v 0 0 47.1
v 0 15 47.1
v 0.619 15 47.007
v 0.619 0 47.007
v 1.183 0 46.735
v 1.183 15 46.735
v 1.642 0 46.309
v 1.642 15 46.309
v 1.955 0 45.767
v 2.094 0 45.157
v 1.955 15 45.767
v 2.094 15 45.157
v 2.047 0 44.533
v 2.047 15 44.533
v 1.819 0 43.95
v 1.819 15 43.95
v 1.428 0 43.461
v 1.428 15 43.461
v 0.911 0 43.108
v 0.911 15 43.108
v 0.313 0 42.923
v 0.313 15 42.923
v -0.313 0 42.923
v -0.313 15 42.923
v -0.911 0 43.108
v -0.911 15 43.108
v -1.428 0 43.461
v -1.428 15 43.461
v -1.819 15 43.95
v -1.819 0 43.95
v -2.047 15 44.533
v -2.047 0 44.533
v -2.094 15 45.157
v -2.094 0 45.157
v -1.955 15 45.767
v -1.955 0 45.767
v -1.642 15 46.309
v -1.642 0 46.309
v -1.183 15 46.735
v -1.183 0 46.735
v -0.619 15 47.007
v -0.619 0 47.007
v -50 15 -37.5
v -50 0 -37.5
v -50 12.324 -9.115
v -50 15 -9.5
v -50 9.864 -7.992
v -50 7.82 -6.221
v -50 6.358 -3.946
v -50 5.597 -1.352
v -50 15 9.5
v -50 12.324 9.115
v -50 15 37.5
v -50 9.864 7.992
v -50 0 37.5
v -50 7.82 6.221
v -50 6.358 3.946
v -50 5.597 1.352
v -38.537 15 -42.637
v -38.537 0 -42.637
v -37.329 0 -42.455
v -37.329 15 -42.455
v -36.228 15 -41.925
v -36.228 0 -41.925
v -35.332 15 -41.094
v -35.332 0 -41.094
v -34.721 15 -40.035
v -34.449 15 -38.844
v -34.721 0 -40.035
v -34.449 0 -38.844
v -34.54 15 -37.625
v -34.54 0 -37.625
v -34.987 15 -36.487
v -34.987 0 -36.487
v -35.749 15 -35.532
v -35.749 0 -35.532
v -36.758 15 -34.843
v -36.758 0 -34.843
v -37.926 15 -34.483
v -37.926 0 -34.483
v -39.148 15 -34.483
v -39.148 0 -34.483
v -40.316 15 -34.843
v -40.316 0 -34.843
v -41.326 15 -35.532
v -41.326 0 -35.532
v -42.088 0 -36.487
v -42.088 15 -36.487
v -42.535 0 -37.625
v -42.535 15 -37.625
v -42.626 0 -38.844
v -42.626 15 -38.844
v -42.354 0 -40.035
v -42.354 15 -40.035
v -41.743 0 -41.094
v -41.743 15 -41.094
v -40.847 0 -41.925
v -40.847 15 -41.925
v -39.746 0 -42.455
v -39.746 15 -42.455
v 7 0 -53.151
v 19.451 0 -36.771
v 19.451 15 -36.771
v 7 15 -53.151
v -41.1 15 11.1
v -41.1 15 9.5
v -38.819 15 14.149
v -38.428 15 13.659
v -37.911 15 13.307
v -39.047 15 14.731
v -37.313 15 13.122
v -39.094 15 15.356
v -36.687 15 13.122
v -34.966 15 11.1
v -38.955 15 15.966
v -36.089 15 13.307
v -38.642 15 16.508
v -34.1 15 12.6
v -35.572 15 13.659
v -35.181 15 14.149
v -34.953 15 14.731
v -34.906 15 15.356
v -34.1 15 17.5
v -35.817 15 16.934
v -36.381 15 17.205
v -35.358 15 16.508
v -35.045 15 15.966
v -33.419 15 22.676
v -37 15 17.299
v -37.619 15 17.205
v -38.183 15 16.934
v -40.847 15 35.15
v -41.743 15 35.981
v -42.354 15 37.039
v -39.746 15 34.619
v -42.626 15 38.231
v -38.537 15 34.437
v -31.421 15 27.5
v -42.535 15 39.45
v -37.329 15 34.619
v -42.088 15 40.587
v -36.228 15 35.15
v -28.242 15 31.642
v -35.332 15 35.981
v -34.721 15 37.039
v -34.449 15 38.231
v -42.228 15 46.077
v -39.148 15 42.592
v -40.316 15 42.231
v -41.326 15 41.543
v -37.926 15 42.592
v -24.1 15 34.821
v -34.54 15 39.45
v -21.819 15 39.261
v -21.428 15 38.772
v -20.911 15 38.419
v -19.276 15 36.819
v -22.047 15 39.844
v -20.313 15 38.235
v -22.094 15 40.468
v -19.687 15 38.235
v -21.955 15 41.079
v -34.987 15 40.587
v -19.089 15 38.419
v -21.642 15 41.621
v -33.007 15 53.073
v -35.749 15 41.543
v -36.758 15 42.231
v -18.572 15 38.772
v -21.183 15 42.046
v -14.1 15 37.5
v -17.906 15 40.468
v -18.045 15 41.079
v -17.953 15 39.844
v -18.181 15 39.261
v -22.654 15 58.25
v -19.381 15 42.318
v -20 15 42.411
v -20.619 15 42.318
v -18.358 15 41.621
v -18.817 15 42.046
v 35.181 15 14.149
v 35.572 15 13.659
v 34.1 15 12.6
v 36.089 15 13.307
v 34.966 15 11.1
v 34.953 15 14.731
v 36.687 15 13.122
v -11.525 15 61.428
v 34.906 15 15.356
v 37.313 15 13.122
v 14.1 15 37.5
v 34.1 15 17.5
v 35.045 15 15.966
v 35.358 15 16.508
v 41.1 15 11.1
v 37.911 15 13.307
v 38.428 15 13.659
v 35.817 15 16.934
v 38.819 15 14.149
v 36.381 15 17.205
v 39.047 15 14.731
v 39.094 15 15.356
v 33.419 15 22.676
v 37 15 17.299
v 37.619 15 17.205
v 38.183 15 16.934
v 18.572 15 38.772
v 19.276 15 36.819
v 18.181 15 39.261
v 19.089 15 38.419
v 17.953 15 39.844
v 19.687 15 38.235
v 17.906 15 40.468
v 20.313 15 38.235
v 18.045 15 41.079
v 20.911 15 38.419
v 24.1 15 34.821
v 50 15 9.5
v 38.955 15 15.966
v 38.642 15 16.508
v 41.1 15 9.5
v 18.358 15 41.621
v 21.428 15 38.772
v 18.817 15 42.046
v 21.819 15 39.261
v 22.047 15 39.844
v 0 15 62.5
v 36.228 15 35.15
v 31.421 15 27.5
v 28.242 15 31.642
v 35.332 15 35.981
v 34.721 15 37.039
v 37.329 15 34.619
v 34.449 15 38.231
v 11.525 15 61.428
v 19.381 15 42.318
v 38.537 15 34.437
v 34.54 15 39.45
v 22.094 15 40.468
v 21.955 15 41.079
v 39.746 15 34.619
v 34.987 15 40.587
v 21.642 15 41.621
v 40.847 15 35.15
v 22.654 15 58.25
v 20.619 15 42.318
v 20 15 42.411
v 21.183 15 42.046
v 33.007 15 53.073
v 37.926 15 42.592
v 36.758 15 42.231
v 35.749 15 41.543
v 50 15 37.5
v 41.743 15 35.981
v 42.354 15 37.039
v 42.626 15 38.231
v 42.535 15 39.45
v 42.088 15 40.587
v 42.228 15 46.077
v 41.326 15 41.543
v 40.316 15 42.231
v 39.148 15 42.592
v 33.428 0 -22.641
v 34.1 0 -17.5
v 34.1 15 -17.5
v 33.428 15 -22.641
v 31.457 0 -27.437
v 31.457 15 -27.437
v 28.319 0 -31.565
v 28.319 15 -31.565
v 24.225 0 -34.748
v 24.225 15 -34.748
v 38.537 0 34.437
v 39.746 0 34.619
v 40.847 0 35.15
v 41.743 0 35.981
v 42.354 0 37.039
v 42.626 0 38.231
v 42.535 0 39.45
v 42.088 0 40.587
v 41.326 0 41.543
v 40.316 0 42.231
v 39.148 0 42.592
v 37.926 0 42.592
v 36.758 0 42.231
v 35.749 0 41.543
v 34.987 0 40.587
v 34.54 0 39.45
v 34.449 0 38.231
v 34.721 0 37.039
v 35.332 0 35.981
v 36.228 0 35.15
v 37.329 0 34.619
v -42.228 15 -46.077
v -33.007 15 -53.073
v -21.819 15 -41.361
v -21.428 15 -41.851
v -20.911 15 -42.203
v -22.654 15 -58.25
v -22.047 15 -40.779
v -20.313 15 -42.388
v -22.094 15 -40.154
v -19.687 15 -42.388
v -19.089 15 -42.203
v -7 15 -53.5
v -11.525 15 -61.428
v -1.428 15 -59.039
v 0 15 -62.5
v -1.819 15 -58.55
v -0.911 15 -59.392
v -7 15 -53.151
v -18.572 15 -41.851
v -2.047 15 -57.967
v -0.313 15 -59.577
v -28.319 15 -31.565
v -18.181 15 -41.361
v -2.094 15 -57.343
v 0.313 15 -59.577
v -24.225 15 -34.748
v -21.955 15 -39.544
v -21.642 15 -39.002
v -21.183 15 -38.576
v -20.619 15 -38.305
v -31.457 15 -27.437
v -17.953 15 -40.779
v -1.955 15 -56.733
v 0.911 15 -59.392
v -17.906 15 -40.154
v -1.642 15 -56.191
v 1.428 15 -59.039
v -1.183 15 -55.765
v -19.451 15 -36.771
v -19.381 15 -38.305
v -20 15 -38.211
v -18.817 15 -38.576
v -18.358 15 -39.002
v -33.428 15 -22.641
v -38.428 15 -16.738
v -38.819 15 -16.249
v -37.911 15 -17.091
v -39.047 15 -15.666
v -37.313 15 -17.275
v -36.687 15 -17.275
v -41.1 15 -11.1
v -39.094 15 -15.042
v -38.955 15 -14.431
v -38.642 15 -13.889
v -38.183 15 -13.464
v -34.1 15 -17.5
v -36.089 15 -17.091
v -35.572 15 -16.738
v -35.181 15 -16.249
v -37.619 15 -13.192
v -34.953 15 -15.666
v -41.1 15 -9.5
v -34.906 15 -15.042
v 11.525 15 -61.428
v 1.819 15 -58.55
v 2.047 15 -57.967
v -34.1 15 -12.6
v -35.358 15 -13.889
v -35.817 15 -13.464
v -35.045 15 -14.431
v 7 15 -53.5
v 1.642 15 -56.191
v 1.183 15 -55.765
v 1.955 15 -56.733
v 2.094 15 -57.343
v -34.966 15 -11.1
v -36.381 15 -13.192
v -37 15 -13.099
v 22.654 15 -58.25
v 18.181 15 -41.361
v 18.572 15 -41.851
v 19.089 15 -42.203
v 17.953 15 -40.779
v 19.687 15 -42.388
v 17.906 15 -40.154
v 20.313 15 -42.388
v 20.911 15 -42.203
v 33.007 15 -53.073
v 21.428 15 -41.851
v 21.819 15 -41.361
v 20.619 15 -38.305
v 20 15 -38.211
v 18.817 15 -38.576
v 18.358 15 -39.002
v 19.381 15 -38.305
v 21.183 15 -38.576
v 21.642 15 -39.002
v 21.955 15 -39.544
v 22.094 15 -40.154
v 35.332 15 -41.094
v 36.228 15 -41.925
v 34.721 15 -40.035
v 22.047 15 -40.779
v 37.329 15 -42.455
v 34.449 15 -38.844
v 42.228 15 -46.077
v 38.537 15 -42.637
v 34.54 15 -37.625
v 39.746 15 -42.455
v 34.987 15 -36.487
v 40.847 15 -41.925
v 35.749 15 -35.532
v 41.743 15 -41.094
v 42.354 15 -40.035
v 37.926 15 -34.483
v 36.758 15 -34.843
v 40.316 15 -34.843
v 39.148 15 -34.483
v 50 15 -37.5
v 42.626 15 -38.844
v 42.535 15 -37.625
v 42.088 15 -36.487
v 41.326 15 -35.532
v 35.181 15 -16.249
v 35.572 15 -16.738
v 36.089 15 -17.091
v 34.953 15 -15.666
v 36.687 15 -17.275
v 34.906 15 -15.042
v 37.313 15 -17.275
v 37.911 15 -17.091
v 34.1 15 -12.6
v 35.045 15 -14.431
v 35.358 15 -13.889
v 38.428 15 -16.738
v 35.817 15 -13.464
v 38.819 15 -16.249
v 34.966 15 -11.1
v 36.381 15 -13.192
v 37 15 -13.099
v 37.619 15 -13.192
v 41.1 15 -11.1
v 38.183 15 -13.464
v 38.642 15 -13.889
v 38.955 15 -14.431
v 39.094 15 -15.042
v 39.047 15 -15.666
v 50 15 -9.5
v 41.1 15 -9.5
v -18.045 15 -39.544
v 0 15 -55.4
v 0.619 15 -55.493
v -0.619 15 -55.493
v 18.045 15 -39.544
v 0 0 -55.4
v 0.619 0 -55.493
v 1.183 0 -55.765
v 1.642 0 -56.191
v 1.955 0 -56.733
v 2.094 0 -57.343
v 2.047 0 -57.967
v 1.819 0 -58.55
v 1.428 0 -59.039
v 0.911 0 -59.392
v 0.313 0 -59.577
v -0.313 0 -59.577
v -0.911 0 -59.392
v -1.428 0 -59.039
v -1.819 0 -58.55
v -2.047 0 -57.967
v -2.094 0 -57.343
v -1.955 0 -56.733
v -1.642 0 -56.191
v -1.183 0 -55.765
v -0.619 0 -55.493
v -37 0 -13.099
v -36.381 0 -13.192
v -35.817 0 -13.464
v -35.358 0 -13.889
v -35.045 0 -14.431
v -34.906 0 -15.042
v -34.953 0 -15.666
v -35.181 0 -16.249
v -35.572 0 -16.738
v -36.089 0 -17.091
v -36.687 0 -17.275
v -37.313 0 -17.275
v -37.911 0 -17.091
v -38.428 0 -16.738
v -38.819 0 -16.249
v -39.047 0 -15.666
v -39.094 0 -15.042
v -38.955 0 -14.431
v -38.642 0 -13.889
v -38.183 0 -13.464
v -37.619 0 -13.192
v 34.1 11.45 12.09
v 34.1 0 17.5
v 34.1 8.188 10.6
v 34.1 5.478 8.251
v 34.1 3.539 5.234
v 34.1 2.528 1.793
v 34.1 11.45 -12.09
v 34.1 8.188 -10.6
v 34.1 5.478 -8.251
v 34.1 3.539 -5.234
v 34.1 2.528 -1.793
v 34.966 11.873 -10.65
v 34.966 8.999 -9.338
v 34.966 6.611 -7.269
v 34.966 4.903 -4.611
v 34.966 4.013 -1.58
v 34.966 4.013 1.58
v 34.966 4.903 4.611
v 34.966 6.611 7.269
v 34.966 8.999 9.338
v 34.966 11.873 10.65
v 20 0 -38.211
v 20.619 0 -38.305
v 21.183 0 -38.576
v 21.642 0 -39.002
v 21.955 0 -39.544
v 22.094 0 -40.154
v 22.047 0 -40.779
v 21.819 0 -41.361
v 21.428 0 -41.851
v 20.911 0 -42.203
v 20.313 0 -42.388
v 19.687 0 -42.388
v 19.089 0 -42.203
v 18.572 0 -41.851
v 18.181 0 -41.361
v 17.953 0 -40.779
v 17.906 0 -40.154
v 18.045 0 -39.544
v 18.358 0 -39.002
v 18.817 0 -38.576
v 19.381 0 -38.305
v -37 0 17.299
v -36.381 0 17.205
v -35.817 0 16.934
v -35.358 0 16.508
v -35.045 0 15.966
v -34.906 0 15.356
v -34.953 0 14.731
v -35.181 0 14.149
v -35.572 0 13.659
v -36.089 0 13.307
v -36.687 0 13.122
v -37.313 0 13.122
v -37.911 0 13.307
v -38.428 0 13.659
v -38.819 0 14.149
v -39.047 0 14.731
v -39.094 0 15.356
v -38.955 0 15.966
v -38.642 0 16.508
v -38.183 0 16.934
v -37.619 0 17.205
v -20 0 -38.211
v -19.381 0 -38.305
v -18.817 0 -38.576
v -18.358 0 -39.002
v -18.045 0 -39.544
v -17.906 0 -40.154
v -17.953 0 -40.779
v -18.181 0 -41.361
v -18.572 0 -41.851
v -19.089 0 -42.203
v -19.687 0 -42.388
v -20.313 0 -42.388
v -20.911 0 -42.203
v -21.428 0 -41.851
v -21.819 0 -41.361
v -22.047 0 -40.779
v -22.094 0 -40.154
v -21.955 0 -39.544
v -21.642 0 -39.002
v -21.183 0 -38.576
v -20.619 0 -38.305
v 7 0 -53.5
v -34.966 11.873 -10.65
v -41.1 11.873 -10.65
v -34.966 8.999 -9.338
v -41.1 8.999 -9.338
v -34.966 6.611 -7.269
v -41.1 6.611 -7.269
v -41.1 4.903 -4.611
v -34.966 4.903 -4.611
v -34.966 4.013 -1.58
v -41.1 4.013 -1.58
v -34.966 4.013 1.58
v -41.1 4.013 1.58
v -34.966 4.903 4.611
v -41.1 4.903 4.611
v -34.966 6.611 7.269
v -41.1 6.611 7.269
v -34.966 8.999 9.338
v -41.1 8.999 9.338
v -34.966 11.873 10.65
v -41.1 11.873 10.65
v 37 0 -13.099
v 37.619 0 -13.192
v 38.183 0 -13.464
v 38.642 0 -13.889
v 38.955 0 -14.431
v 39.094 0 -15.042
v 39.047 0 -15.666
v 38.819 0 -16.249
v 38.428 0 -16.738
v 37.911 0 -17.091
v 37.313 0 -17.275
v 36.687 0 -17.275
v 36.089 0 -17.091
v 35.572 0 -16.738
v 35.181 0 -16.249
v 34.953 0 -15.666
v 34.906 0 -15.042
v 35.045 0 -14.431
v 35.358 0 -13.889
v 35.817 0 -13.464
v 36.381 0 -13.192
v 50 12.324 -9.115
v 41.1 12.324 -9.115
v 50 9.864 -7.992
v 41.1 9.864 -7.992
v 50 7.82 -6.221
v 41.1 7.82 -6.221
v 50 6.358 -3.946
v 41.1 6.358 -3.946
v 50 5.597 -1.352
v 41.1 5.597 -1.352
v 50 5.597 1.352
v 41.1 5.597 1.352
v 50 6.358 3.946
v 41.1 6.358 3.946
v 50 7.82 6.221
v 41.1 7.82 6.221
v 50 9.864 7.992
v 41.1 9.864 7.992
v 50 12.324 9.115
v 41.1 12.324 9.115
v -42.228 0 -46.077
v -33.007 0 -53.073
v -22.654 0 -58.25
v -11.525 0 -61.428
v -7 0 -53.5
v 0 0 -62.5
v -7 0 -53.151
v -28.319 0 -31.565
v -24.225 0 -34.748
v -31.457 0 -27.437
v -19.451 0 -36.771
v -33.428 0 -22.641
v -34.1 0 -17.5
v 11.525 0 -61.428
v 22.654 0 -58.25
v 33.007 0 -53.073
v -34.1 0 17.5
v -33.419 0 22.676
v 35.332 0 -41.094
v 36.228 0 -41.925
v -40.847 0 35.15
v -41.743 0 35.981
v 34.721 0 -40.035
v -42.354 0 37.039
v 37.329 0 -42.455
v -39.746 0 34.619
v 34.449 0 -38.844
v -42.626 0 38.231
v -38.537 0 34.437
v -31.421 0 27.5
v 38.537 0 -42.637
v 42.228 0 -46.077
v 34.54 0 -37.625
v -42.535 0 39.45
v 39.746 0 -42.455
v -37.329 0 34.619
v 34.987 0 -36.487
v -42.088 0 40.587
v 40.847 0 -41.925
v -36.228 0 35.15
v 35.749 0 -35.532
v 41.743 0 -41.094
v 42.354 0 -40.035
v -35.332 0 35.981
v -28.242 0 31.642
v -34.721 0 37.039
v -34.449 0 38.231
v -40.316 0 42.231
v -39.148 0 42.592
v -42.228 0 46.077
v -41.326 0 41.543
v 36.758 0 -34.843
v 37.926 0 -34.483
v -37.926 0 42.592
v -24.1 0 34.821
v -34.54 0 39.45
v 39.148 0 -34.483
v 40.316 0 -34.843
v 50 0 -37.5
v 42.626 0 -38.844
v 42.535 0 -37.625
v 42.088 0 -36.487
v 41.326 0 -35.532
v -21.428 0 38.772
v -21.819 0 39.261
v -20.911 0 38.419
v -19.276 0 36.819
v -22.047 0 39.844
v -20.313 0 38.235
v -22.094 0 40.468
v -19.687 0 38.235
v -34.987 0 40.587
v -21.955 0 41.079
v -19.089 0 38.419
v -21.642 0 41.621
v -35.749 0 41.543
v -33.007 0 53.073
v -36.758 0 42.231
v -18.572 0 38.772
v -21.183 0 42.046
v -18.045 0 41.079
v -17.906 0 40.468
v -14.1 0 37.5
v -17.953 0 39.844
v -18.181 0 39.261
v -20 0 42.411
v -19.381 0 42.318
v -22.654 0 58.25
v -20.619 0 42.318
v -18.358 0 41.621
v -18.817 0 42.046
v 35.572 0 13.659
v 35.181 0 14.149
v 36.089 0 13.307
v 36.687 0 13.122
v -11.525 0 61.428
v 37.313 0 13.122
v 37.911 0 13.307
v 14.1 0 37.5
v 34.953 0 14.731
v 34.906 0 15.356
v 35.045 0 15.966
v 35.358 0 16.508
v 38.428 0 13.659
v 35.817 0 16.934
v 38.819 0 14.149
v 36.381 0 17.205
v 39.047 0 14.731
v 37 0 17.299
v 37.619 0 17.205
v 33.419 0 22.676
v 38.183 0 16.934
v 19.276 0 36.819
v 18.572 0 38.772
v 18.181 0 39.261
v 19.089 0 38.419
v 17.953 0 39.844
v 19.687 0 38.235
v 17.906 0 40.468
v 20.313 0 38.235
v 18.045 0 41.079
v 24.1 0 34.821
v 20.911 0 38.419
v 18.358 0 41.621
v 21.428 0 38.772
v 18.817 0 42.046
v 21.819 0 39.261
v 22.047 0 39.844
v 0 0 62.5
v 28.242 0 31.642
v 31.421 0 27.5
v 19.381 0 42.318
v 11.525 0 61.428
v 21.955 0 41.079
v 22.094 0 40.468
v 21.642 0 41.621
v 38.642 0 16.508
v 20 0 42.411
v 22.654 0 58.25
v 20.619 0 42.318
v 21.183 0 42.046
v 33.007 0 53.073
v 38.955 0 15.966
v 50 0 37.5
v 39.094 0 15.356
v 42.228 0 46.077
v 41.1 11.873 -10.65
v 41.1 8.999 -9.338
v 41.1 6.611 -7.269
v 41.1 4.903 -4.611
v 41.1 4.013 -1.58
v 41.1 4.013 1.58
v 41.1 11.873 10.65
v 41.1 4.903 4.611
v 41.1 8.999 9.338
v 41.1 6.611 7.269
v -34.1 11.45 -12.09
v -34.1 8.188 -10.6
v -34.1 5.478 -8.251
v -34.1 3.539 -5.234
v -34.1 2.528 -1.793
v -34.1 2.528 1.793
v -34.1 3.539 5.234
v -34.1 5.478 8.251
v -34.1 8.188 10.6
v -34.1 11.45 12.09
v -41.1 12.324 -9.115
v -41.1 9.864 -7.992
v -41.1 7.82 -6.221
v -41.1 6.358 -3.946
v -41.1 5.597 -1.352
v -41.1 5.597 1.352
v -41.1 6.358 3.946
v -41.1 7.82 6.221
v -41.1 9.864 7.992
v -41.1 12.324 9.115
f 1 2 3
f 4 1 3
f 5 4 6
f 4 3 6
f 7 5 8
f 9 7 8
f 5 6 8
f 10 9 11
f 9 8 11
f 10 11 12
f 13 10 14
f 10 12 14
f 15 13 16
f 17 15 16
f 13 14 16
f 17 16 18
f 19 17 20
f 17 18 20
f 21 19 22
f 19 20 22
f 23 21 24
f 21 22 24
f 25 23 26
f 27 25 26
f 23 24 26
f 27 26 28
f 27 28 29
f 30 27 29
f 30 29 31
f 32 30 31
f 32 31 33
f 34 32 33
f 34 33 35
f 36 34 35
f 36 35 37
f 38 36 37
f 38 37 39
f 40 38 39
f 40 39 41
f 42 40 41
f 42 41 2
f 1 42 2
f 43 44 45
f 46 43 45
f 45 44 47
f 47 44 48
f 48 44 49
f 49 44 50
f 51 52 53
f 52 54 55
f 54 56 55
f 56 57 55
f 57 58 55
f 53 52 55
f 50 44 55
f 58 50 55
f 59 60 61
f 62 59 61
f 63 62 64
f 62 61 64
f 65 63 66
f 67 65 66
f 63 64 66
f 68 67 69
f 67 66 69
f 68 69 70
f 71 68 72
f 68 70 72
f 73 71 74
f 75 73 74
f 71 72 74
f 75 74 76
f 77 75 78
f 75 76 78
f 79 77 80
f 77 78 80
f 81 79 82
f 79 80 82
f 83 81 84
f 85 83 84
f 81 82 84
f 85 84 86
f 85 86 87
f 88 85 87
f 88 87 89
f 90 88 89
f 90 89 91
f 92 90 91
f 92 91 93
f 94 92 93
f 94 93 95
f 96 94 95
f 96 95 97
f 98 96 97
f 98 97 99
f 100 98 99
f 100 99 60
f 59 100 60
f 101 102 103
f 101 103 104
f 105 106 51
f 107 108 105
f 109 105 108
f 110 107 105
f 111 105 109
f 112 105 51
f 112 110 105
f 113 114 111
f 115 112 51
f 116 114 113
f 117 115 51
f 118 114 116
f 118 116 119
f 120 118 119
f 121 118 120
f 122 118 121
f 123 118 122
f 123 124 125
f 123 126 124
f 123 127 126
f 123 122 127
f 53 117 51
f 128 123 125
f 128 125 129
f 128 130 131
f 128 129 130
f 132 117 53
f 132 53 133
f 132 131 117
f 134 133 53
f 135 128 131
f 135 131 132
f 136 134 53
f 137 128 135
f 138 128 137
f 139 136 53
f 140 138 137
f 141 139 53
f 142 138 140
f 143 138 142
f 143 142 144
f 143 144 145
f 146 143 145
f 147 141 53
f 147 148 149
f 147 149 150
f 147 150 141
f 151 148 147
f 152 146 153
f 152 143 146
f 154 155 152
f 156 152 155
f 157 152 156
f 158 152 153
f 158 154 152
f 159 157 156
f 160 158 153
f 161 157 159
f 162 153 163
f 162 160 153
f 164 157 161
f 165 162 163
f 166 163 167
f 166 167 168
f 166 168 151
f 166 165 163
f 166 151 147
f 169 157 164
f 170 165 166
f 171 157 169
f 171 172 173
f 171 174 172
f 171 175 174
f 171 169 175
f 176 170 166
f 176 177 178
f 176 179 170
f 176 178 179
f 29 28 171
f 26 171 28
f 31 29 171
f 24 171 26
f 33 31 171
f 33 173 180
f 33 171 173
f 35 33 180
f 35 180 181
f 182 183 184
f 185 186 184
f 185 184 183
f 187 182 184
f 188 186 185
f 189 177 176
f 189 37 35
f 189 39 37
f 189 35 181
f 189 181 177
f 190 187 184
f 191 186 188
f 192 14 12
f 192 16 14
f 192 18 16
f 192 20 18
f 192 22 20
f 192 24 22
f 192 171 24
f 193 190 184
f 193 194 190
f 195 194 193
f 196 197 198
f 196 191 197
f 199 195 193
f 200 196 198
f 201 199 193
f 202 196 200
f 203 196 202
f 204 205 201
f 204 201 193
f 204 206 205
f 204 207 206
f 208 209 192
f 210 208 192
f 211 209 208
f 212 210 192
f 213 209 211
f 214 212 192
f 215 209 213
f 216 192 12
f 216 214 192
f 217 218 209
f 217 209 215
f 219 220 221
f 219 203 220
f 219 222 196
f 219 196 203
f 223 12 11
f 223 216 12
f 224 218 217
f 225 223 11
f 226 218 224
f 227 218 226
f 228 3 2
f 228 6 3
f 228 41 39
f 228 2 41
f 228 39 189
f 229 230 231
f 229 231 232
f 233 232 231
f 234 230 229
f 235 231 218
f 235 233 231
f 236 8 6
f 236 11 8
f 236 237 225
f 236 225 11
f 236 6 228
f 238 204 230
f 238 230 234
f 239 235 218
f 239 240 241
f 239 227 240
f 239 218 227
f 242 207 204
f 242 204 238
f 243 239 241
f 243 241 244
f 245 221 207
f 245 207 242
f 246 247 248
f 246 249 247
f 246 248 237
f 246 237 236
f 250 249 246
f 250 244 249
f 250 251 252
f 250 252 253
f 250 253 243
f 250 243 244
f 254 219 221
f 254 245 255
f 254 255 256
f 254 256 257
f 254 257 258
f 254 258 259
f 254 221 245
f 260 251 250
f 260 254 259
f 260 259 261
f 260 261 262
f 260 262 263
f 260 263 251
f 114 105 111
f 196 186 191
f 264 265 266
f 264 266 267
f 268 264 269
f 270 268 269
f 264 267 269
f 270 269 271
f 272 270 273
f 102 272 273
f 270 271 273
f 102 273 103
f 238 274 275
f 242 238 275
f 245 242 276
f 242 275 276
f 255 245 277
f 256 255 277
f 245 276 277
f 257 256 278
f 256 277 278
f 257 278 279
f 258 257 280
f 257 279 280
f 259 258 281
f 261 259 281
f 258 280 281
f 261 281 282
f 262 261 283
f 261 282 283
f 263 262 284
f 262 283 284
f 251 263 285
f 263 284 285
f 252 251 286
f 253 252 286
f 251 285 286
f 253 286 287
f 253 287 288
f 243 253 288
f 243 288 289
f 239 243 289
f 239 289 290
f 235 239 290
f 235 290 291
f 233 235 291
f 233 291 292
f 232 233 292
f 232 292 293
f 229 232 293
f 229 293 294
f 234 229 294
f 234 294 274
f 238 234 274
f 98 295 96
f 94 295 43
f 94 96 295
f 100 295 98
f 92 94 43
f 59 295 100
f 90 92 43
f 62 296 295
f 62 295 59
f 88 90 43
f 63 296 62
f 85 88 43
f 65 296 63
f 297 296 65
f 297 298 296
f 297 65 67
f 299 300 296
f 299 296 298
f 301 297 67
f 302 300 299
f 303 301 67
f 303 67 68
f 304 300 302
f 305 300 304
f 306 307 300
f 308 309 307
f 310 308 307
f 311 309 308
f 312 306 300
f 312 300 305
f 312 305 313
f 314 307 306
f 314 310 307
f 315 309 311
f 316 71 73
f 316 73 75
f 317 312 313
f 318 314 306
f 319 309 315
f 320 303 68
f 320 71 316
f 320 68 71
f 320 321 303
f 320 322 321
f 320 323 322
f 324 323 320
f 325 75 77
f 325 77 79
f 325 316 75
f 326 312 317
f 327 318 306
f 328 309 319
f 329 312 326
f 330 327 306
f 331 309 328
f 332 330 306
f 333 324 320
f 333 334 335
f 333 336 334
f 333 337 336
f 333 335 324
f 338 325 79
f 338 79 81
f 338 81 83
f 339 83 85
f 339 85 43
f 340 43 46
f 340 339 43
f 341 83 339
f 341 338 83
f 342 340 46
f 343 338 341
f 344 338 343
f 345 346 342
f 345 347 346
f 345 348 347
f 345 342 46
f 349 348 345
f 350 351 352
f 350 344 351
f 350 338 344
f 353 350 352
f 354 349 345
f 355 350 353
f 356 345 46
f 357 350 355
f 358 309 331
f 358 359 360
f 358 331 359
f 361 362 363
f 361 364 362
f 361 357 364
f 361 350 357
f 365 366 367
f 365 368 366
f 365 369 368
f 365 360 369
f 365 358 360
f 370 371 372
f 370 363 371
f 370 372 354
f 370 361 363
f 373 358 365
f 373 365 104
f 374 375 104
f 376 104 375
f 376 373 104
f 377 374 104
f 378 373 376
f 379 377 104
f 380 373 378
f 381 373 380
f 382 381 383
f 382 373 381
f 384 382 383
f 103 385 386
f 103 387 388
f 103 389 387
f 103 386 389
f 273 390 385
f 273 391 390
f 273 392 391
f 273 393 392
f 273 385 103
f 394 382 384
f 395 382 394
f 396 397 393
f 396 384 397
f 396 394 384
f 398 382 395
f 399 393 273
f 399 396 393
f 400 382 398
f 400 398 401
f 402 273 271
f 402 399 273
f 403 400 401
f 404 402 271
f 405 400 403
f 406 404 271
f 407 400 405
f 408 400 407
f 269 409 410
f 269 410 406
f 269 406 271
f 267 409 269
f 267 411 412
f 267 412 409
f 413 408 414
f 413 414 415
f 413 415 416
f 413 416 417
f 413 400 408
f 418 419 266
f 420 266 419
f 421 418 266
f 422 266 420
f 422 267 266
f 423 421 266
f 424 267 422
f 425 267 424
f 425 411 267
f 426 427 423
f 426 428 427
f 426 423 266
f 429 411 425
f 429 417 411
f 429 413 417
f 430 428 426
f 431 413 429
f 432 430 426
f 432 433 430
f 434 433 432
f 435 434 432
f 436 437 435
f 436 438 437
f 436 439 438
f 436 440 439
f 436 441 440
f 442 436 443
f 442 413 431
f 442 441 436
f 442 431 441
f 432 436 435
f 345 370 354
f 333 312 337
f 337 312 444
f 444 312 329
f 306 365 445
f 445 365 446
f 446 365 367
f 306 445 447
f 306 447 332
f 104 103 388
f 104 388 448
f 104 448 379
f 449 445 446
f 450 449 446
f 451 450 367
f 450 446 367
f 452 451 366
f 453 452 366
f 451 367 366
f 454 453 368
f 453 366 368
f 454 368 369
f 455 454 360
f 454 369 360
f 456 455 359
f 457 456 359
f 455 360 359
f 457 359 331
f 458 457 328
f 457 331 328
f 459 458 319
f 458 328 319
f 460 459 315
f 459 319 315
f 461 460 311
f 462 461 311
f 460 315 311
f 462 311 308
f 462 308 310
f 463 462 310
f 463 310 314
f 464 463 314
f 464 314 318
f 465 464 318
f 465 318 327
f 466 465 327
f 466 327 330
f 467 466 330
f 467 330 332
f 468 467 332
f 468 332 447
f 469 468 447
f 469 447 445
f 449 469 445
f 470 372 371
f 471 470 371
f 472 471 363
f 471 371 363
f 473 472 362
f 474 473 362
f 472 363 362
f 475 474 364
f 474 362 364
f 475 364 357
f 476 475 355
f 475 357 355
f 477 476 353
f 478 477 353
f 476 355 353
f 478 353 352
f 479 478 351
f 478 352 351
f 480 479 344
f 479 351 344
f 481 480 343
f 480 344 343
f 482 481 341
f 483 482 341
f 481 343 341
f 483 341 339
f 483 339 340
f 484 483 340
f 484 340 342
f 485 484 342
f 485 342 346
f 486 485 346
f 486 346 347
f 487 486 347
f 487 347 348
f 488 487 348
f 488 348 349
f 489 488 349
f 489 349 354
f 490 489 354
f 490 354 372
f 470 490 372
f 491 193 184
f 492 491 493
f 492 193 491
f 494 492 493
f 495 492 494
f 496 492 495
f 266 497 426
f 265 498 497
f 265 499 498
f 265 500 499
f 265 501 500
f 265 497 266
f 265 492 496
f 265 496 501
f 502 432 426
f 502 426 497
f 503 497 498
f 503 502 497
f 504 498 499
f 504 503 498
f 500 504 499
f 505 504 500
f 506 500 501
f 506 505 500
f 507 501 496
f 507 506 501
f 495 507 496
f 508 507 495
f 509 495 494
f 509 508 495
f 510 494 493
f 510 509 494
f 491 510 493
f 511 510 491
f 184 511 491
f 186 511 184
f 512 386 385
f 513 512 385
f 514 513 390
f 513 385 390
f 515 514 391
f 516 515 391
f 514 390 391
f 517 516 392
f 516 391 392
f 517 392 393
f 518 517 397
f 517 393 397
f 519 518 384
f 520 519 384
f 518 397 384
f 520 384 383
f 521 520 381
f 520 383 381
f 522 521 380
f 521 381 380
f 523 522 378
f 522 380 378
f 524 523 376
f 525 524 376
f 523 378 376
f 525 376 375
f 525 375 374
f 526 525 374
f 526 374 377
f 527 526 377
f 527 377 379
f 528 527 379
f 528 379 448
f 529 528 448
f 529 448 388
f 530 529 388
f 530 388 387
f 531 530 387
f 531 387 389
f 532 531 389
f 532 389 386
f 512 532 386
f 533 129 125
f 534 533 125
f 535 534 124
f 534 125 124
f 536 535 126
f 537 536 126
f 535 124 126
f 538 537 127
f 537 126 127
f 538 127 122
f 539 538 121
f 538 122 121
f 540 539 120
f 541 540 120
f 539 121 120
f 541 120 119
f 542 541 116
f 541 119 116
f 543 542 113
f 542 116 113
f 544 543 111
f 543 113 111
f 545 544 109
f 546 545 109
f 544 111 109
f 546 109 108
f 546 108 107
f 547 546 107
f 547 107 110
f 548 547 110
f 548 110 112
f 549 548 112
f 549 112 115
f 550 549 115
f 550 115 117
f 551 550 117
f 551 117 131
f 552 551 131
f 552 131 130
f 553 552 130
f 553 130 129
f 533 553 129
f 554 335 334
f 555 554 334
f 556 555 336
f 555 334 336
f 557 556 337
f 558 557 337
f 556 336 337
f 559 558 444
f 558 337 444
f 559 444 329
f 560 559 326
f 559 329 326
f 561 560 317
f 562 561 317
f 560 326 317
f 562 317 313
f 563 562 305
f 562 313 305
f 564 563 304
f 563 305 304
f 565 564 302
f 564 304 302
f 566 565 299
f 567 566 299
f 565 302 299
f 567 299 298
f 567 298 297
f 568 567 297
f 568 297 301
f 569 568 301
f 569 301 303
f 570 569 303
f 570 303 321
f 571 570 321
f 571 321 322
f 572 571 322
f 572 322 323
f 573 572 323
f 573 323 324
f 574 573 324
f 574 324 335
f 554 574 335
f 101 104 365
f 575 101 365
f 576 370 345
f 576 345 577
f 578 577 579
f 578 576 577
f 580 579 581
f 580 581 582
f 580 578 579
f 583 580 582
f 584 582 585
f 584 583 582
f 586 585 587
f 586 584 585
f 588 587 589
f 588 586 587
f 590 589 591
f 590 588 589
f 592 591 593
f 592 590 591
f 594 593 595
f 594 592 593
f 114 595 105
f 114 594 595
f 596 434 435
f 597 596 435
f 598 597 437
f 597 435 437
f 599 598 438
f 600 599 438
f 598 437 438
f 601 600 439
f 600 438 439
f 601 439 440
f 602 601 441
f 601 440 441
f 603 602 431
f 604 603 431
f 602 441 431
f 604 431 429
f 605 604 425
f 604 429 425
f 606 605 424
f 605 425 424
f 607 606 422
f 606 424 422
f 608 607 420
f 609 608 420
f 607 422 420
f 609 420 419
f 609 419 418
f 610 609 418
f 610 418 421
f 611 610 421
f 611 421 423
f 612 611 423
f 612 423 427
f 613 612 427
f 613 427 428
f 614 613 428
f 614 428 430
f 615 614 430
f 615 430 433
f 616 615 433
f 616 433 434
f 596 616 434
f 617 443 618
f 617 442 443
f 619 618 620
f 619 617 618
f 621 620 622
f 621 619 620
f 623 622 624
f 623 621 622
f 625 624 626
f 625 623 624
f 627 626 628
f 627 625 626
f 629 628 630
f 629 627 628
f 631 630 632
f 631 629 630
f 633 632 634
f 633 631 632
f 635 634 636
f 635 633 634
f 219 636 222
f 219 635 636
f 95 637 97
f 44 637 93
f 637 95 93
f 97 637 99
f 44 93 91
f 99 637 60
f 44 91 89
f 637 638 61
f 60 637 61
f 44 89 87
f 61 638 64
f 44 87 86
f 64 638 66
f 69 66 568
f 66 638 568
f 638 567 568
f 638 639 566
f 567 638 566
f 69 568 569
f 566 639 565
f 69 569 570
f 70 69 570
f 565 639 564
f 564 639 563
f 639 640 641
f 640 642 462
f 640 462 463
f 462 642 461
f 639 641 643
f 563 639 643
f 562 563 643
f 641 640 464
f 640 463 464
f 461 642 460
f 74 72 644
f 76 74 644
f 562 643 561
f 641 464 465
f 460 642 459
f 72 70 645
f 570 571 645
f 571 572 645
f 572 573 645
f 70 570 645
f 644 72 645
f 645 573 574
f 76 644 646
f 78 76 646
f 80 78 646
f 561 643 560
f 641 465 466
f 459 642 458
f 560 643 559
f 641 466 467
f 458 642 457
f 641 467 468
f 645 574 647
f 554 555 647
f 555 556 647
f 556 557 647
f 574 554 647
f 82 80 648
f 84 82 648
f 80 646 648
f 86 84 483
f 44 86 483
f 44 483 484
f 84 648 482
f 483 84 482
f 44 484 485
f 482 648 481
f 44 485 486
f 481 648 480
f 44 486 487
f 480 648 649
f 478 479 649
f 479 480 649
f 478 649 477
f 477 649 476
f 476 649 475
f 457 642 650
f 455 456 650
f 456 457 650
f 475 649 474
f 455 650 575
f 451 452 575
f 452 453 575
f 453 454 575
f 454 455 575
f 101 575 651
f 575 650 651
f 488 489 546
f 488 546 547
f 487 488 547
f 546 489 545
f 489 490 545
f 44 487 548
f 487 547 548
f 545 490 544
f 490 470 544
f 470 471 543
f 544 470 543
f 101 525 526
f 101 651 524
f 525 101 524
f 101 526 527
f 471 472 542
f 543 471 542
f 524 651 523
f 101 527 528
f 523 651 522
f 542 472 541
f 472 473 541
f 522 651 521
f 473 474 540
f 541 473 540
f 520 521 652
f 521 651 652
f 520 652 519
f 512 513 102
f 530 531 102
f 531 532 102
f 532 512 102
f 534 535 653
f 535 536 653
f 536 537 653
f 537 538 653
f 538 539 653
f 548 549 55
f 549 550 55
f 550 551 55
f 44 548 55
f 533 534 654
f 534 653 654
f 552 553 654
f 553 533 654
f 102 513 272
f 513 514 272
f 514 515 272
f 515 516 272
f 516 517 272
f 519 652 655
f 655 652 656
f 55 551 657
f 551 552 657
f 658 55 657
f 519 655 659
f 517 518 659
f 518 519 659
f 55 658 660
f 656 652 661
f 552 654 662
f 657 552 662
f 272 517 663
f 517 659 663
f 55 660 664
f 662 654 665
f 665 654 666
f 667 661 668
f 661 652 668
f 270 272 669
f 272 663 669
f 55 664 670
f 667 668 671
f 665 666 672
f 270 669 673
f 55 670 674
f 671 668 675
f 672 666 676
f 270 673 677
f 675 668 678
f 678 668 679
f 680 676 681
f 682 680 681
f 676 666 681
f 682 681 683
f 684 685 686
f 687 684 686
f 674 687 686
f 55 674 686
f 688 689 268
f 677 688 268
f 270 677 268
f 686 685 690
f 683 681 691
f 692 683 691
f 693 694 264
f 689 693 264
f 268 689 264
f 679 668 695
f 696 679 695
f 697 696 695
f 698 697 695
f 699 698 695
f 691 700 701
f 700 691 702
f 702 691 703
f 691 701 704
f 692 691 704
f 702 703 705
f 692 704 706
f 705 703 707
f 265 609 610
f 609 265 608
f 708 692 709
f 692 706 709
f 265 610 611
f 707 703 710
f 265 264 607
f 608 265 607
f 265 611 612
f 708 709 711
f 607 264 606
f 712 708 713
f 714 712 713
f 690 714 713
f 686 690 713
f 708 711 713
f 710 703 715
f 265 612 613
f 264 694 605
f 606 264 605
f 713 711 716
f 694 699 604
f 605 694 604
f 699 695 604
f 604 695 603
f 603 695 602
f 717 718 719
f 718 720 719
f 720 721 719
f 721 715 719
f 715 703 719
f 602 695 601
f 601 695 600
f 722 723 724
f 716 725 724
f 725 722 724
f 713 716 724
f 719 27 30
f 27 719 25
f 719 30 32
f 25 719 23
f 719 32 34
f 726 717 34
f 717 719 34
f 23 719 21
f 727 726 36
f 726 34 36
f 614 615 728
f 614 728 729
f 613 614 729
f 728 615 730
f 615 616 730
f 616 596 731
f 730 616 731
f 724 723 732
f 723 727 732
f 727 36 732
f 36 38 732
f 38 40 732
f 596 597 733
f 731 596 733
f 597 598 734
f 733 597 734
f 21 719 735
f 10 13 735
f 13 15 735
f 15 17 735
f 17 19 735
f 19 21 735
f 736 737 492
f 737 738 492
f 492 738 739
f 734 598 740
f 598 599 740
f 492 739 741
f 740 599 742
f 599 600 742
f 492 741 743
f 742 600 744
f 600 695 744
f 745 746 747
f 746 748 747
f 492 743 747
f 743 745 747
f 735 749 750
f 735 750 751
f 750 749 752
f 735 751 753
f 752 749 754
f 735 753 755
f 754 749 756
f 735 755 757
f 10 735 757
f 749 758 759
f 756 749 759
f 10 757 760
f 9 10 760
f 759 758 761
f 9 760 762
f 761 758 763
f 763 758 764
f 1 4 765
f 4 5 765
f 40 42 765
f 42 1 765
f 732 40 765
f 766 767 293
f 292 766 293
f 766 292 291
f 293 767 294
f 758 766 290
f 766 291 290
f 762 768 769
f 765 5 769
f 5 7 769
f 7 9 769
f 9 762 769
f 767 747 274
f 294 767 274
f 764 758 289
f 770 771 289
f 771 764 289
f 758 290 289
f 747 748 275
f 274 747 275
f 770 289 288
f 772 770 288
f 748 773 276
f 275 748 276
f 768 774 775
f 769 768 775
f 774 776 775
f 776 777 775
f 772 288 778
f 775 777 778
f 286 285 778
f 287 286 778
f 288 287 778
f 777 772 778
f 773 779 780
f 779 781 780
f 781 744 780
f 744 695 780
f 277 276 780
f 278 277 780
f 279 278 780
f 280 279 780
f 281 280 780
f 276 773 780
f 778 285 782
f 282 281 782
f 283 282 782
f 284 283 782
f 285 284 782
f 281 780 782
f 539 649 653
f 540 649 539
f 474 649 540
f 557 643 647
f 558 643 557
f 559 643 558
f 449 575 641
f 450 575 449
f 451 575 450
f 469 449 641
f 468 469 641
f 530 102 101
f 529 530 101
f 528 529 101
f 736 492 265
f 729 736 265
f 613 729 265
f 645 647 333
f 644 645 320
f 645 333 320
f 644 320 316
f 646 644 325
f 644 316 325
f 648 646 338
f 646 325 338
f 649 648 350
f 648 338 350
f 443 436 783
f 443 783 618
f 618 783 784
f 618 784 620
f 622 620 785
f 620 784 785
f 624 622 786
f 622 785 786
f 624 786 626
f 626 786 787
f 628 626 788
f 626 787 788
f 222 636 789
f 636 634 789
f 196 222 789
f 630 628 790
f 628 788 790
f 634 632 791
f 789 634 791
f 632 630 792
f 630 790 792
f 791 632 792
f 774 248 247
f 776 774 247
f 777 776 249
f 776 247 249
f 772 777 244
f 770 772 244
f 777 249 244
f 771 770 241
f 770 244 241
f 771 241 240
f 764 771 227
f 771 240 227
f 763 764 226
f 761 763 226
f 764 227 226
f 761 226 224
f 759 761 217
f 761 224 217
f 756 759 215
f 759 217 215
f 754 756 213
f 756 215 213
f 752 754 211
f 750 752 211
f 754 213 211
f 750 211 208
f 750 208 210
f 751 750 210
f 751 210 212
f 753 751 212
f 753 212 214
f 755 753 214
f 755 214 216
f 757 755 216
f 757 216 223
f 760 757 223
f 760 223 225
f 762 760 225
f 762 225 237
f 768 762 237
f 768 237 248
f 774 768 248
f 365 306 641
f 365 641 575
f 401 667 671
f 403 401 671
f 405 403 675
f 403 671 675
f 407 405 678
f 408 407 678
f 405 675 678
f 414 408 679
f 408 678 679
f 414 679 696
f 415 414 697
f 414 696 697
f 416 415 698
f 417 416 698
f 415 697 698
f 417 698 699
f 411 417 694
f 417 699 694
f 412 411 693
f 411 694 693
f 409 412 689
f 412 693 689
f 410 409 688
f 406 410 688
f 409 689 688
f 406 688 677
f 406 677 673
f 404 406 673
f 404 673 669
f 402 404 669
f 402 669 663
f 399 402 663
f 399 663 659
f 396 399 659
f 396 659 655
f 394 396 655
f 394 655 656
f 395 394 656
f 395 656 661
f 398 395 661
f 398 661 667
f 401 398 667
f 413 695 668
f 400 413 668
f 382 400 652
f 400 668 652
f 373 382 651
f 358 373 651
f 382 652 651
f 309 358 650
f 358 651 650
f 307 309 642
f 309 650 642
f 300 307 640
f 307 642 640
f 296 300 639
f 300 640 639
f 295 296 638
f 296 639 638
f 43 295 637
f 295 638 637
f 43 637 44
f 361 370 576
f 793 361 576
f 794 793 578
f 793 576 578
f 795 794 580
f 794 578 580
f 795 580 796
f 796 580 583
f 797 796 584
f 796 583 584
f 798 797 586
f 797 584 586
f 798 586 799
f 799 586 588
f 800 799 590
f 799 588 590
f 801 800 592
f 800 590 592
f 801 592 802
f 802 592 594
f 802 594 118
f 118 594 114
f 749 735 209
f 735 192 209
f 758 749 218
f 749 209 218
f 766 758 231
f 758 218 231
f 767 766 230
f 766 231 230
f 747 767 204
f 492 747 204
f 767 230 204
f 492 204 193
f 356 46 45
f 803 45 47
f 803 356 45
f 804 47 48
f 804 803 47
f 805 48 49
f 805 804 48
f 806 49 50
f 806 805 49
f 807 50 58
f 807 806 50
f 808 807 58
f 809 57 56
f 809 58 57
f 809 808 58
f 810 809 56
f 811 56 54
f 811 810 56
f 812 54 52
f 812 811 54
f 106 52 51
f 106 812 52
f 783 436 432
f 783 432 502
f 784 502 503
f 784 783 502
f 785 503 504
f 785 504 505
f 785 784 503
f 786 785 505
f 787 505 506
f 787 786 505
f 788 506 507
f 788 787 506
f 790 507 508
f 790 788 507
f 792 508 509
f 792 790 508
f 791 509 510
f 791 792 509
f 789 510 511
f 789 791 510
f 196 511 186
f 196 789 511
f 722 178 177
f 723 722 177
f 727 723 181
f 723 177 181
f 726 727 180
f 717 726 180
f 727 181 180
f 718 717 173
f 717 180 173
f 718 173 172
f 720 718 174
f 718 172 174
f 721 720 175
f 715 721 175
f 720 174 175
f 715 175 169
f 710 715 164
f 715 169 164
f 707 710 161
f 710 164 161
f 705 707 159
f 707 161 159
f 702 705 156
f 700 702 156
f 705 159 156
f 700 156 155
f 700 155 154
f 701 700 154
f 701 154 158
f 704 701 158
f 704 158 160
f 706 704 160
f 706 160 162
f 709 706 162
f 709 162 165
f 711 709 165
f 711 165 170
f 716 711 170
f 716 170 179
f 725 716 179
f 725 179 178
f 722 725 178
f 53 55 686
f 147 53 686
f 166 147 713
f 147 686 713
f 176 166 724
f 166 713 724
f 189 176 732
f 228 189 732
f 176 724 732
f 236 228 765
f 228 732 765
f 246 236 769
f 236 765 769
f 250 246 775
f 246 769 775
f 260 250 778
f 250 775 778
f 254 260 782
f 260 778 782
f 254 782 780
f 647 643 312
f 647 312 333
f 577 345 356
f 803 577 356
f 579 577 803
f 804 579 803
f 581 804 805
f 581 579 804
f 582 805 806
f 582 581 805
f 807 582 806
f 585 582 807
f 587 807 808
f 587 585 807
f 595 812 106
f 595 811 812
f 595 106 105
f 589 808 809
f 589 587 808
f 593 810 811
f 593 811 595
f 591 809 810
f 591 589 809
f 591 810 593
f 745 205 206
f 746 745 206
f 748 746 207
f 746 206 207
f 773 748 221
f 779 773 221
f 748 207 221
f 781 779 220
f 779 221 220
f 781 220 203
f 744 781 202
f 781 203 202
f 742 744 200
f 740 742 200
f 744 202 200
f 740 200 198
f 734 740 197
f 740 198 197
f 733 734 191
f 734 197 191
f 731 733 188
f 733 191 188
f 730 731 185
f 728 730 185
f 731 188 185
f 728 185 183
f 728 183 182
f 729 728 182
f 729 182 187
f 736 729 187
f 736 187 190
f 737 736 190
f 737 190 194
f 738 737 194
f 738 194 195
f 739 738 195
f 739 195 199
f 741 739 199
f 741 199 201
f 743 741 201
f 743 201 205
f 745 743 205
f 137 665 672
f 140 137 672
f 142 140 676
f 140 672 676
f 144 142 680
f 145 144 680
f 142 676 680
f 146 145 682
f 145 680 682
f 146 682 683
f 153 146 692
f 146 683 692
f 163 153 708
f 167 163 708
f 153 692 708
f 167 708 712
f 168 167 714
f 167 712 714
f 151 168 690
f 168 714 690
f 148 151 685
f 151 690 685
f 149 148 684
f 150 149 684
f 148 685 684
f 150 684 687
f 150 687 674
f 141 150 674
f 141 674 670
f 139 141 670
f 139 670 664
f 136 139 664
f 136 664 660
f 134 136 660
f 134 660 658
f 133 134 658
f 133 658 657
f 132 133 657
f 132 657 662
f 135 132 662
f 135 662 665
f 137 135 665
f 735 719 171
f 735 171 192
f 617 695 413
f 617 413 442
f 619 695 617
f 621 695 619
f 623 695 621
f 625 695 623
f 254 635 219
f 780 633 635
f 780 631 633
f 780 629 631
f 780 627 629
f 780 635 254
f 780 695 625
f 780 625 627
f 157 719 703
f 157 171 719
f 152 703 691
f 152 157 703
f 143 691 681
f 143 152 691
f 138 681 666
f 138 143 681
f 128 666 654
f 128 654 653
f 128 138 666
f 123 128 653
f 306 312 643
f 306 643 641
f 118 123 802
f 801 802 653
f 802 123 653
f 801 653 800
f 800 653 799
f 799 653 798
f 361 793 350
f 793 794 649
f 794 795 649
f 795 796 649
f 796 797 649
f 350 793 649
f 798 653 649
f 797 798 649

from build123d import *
from OCP.BRepFilletAPI import BRepFilletAPI_MakeChamfer

# Parameters (mm, degrees)
SKETCH2_R               = 62.5
SKETCH2_W               = 68.2
SKETCH2_H               = 75
BOSS_EXTRUDE1_DEPTH     = 15
SKETCH7_W               = 7
SKETCH7_H               = 11.1
CUT_EXTRUDE1_DEPTH      = 122.918866465
CUT_EXTRUDE1_DEPTH_BACK = 122.918866465
SKETCH8_R               = 9.5
FILLET1_R               = 20
SKETCH9_R               = 2.1
CUT_EXTRUDE2_DEPTH      = 90.652105542
CHAMFER1_SIZE           = 1.5
CHAMFER1_SIZE2          = 0.866025404
SKETCH10_R              = 4.1
CUT_EXTRUDE3_DEPTH      = 90.652105542
CUT_EXTRUDE4_DEPTH      = 90.652105542
SKETCH12_W              = 14
SKETCH12_H              = 16
CUT_EXTRUDE5_DEPTH      = 90.652105542
CHAMFER2_DEPTH          = 15
CUT_EXTRUDE6_DEPTH      = 90.652105542


with BuildPart() as part:
    # Sketch2 → Boss-Extrude1 (new body)
    with BuildSketch(Plane(origin=(0, 0, 0), x_dir=(1, 0, 0), z_dir=(0, 1, 0))):
        with Locations(Location((0, 0, 0), (0, 0, 270))):
            Circle(SKETCH2_R)
        Rectangle(SKETCH2_W, SKETCH2_H, mode=Mode.SUBTRACT)
    extrude(amount=BOSS_EXTRUDE1_DEPTH)

    # Sketch7 → Cut-Revolve2 (revolve, cut)
    with BuildSketch(Plane(origin=(0, 15, 0), x_dir=(1, 0, 0), z_dir=(0, 1, 0))):
        with Locations((-37.6, 5.55)):
            Rectangle(SKETCH7_W, SKETCH7_H)
        with Locations((37.6, 5.55)):
            Rectangle(SKETCH7_W, SKETCH7_H)
    revolve(axis=Axis((62.5, 15, 0), (-1, 0, 0)), mode=Mode.SUBTRACT)

    # Sketch8 → Cut-Extrude1 (cut, two sides: drawn at the far end of the back side and taken through both)
    with BuildSketch(Plane.ZY.offset(-41.1).offset(-CUT_EXTRUDE1_DEPTH_BACK)):
        with Locations((0, 15)):
            Circle(SKETCH8_R)
    extrude(amount=CUT_EXTRUDE1_DEPTH + CUT_EXTRUDE1_DEPTH_BACK, mode=Mode.SUBTRACT)

    # Fillet1
    fillet1_edges = [part.edges().sort_by_distance(p)[0] for p in [
        (-34.1, 7.5, -37.5),
        (-34.1, 7.5, 37.5),
        (34.1, 7.5, 37.5),
        (34.1, 7.5, -37.5),
    ]]
    fillet(fillet1_edges, radius=FILLET1_R)

    # Sketch9 → Cut-Extrude2 (cut, through all)
    with BuildSketch(Plane(origin=(0, 15, 0), x_dir=(1, 0, 0), z_dir=(0, 1, 0))):
        with Locations(Location((-37, 15.198684154, 0), (0, 0, 270))):
            Circle(SKETCH9_R)
        with Locations(Location((37, 15.198684154, 0), (0, 0, 270))):
            Circle(SKETCH9_R)
        with Locations(Location((37, -15.198684154, 0), (0, 0, 270))):
            Circle(SKETCH9_R)
        with Locations(Location((-37, -15.198684154, 0), (0, 0, 270))):
            Circle(SKETCH9_R)
        with Locations(Location((-20, 40.311288741, 0), (0, 0, 270))):
            Circle(SKETCH9_R)
        with Locations(Location((20, 40.311288741, 0), (0, 0, 270))):
            Circle(SKETCH9_R)
        with Locations(Location((20, -40.311288741, 0), (0, 0, 270))):
            Circle(SKETCH9_R)
        with Locations(Location((-20, -40.311288741, 0), (0, 0, 270))):
            Circle(SKETCH9_R)
        with Locations(Location((0, -45, 0), (0, 0, 270))):
            Circle(SKETCH9_R)
        with Locations(Location((0, 57.5, 0), (0, 0, 270))):
            Circle(SKETCH9_R)
    extrude(amount=-CUT_EXTRUDE2_DEPTH, mode=Mode.SUBTRACT)

    # Chamfer1: one chamfer whose edges measure the first distance from different faces: ONE call of the kernel's chamfer builder (chamfer() names one face for all edges)
    chamfer1_edges_1 = [part.edges().sort_by_distance(p)[0] for p in [
        (-34.1, 3.9, 0),
    ]]
    chamfer1_side_1 = [part.faces().sort_by_distance(p)[0] for p in [
        (-34.1, 0.380788655, 0),
    ]]
    chamfer1_edges_2 = [part.edges().sort_by_distance(p)[0] for p in [
        (34.1, 3.9, 0),
    ]]
    chamfer1_side_2 = [part.faces().sort_by_distance(p)[0] for p in [
        (34.1, 0.380788655, 0),
    ]]
    chamfer1 = BRepFilletAPI_MakeChamfer(part.part.solid().wrapped)
    for e in chamfer1_edges_1:
        chamfer1.Add(CHAMFER1_SIZE, CHAMFER1_SIZE2, e.wrapped, chamfer1_side_1[0].wrapped)  # the first distance lies on this face
    for e in chamfer1_edges_2:
        chamfer1.Add(CHAMFER1_SIZE, CHAMFER1_SIZE2, e.wrapped, chamfer1_side_2[0].wrapped)  # the first distance lies on this face
    add(Compound.cast(chamfer1.Shape()), mode=Mode.REPLACE)

    # Sketch10 → Cut-Extrude3 (cut, through all)
    with BuildSketch(Plane.XZ):
        with Locations(Location((38.537319575, -38.537319575, 0), (0, 0, 270))):
            Circle(SKETCH10_R)
        with Locations(Location((-38.537319575, -38.537319575, 0), (0, 0, 270))):
            Circle(SKETCH10_R)
        with Locations(Location((-38.537319575, 38.537319575, 0), (0, 0, 270))):
            Circle(SKETCH10_R)
        with Locations(Location((38.537319575, 38.537319575, 0), (0, 0, 270))):
            Circle(SKETCH10_R)
    extrude(amount=-CUT_EXTRUDE3_DEPTH, mode=Mode.SUBTRACT)

    # Sketch11 → Cut-Extrude4 (cut, through all)
    with BuildSketch(Plane.XZ):
        with BuildLine():
            Line((50, -37.5), (50, 37.5))
            ThreePointArc((50, 37.5), (62.5, 0), (50, -37.5))
        make_face()
    extrude(amount=-CUT_EXTRUDE4_DEPTH, mode=Mode.SUBTRACT)

    # Sketch12 → Cut-Extrude5 (cut, through all)
    with BuildSketch(Plane(origin=(0, 15, 0), x_dir=(1, 0, 0), z_dir=(0, 1, 0))):
        with Locations((0, 45.5)):
            Rectangle(SKETCH12_W, SKETCH12_H)
    extrude(amount=-CUT_EXTRUDE5_DEPTH, mode=Mode.SUBTRACT)

    # Chamfer2: read off the stored shape, not the designer's step
    # Chamfer2 outline → Chamfer2 (cut)
    with BuildSketch(Plane(origin=(0, 0, 0), x_dir=(1, 0, 0), z_dir=(0, 1, 0))):
        with BuildLine():
            ThreePointArc((14.1, 37.5), (16.800403682, 37.316856965), (19.451351351, 36.770781996))
            Line((19.451351351, 36.770781996), (7, 53.150946691))
            Line((7, 53.150946691), (7, 37.5))
            Line((7, 37.5), (14.1, 37.5))
        make_face()
        with BuildLine():
            Line((-7, 37.5), (-7, 53.150946691))
            Line((-7, 53.150946691), (-19.451351351, 36.770781996))
            ThreePointArc((-19.451351351, 36.770781996), (-16.800403682, 37.316856965), (-14.1, 37.5))
            Line((-14.1, 37.5), (-7, 37.5))
        make_face()
    extrude(amount=CHAMFER2_DEPTH, mode=Mode.SUBTRACT)

    # Sketch13 → Cut-Extrude6 (cut, through all)
    with BuildSketch(Plane.XZ):
        with BuildLine():
            Line((-50, -37.5), (-50, 37.5))
            ThreePointArc((-50, 37.5), (-62.5, 0), (-50, -37.5))
        make_face()
    extrude(amount=-CUT_EXTRUDE6_DEPTH, mode=Mode.SUBTRACT)


solid = part.part
